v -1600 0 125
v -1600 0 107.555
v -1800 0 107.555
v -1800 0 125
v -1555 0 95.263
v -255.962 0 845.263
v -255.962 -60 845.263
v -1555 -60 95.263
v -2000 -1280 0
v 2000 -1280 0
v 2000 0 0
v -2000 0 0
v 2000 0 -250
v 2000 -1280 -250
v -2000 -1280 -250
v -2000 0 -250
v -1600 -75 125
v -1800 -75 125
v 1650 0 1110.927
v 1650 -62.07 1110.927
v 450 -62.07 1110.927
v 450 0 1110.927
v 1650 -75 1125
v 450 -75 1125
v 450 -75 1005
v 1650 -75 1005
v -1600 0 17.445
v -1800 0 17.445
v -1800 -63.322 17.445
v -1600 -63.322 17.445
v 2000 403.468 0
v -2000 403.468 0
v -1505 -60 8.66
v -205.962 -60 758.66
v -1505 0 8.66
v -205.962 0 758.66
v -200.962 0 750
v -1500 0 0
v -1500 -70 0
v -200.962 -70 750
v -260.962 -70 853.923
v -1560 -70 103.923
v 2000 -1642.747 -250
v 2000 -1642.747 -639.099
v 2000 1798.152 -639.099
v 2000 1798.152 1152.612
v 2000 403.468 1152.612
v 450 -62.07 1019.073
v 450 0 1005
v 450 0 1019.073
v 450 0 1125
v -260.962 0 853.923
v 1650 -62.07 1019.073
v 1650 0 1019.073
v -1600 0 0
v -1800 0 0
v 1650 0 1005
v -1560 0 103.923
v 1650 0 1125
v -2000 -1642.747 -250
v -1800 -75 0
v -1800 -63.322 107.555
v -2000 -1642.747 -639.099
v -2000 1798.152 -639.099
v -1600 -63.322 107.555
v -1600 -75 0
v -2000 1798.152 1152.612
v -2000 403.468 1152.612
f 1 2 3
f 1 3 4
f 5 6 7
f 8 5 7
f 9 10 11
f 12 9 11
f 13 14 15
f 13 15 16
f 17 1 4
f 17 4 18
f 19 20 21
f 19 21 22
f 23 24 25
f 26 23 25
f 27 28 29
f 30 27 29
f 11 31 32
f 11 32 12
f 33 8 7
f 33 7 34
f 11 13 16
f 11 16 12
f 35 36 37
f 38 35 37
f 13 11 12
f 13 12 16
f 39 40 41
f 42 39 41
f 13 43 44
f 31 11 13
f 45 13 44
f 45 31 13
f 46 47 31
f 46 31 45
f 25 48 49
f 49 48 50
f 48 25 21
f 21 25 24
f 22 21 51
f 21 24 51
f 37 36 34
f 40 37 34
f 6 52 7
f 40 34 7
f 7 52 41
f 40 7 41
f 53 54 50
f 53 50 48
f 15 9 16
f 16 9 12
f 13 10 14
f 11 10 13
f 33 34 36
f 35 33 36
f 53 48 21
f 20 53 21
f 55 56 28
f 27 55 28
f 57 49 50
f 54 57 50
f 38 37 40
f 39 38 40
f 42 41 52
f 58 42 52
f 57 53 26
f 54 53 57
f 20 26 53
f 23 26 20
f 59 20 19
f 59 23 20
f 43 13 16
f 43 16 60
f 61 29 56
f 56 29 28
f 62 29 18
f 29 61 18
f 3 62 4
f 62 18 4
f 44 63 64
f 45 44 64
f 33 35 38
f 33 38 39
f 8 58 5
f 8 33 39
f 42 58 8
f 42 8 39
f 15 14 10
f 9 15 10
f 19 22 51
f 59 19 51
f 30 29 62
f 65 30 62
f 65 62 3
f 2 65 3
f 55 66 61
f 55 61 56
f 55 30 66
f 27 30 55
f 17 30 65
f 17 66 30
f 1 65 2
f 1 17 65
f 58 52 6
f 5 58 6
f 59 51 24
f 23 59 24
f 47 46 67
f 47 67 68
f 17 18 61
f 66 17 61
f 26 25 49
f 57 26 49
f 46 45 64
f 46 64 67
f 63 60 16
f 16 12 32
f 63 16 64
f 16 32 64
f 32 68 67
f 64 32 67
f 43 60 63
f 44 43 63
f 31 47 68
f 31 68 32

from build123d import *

# Parameters (mm, degrees)
F2_W      = 1280
F2_H      = 250
F3_DEPTH  = 4000
F5_DEPTH  = 4000
F8_DEPTH  = 200
F12_DEPTH = 1200
F16_DEPTH = 1500


with BuildPart() as f3:
    # F2 (on offset) → F3 (new body)
    with BuildSketch(Plane.YZ.offset(2000)):
        with Locations((-640, -125)):
            Rectangle(F2_W, F2_H)
    extrude(amount=-F3_DEPTH)


with BuildPart() as f5:
    # F4 (on face) → F5 (new body)
    with BuildSketch(Plane.YZ.offset(2000)):
        Polygon((403.468102, 0), (0, 0), (0, -250), (-1642.747402, -250), (-1642.747402, -639.098883), (1798.152328, -639.098883), (1798.152328, 1152.612209), (403.468102, 1152.612209), align=None)
    extrude(amount=-F5_DEPTH)


with BuildPart() as f8:
    # F7 (on offset) → F8 (new body)
    with BuildSketch(Plane.YZ.offset(-1800)):
        Polygon((-75, 125), (-75, 0), (0, 0), (0, 17.445398), (-63.321888, 17.445398), (-63.321888, 107.554602), (0, 107.554602), (0, 125), align=None)
    extrude(amount=F8_DEPTH)


with BuildPart() as f12:
    # F11 (on offset) → F12 (new body)
    with BuildSketch(Plane.YZ.offset(450)):
        Polygon((-75, 1005), (0, 1005), (0, 1019.073129), (-62.069599, 1019.073129), (-62.069599, 1110.926871), (0, 1110.926871), (0, 1125), (-75, 1125), align=None)
    extrude(amount=F12_DEPTH)


with BuildPart() as f16:
    # F15 (on face) → F16 (new body)
    with BuildSketch(Plane(origin=(-1125, 0, -649.519053), x_dir=(0, -1, 0), z_dir=(-0.866025, 0, -0.5))):
        Polygon((70, 870), (0, 870), (0, 860), (60, 860), (60, 760), (0, 760), (0, 750), (70, 750), align=None)
    extrude(amount=-F16_DEPTH)


solid = Compound([f3.part, f5.part, f8.part, f12.part, f16.part])
